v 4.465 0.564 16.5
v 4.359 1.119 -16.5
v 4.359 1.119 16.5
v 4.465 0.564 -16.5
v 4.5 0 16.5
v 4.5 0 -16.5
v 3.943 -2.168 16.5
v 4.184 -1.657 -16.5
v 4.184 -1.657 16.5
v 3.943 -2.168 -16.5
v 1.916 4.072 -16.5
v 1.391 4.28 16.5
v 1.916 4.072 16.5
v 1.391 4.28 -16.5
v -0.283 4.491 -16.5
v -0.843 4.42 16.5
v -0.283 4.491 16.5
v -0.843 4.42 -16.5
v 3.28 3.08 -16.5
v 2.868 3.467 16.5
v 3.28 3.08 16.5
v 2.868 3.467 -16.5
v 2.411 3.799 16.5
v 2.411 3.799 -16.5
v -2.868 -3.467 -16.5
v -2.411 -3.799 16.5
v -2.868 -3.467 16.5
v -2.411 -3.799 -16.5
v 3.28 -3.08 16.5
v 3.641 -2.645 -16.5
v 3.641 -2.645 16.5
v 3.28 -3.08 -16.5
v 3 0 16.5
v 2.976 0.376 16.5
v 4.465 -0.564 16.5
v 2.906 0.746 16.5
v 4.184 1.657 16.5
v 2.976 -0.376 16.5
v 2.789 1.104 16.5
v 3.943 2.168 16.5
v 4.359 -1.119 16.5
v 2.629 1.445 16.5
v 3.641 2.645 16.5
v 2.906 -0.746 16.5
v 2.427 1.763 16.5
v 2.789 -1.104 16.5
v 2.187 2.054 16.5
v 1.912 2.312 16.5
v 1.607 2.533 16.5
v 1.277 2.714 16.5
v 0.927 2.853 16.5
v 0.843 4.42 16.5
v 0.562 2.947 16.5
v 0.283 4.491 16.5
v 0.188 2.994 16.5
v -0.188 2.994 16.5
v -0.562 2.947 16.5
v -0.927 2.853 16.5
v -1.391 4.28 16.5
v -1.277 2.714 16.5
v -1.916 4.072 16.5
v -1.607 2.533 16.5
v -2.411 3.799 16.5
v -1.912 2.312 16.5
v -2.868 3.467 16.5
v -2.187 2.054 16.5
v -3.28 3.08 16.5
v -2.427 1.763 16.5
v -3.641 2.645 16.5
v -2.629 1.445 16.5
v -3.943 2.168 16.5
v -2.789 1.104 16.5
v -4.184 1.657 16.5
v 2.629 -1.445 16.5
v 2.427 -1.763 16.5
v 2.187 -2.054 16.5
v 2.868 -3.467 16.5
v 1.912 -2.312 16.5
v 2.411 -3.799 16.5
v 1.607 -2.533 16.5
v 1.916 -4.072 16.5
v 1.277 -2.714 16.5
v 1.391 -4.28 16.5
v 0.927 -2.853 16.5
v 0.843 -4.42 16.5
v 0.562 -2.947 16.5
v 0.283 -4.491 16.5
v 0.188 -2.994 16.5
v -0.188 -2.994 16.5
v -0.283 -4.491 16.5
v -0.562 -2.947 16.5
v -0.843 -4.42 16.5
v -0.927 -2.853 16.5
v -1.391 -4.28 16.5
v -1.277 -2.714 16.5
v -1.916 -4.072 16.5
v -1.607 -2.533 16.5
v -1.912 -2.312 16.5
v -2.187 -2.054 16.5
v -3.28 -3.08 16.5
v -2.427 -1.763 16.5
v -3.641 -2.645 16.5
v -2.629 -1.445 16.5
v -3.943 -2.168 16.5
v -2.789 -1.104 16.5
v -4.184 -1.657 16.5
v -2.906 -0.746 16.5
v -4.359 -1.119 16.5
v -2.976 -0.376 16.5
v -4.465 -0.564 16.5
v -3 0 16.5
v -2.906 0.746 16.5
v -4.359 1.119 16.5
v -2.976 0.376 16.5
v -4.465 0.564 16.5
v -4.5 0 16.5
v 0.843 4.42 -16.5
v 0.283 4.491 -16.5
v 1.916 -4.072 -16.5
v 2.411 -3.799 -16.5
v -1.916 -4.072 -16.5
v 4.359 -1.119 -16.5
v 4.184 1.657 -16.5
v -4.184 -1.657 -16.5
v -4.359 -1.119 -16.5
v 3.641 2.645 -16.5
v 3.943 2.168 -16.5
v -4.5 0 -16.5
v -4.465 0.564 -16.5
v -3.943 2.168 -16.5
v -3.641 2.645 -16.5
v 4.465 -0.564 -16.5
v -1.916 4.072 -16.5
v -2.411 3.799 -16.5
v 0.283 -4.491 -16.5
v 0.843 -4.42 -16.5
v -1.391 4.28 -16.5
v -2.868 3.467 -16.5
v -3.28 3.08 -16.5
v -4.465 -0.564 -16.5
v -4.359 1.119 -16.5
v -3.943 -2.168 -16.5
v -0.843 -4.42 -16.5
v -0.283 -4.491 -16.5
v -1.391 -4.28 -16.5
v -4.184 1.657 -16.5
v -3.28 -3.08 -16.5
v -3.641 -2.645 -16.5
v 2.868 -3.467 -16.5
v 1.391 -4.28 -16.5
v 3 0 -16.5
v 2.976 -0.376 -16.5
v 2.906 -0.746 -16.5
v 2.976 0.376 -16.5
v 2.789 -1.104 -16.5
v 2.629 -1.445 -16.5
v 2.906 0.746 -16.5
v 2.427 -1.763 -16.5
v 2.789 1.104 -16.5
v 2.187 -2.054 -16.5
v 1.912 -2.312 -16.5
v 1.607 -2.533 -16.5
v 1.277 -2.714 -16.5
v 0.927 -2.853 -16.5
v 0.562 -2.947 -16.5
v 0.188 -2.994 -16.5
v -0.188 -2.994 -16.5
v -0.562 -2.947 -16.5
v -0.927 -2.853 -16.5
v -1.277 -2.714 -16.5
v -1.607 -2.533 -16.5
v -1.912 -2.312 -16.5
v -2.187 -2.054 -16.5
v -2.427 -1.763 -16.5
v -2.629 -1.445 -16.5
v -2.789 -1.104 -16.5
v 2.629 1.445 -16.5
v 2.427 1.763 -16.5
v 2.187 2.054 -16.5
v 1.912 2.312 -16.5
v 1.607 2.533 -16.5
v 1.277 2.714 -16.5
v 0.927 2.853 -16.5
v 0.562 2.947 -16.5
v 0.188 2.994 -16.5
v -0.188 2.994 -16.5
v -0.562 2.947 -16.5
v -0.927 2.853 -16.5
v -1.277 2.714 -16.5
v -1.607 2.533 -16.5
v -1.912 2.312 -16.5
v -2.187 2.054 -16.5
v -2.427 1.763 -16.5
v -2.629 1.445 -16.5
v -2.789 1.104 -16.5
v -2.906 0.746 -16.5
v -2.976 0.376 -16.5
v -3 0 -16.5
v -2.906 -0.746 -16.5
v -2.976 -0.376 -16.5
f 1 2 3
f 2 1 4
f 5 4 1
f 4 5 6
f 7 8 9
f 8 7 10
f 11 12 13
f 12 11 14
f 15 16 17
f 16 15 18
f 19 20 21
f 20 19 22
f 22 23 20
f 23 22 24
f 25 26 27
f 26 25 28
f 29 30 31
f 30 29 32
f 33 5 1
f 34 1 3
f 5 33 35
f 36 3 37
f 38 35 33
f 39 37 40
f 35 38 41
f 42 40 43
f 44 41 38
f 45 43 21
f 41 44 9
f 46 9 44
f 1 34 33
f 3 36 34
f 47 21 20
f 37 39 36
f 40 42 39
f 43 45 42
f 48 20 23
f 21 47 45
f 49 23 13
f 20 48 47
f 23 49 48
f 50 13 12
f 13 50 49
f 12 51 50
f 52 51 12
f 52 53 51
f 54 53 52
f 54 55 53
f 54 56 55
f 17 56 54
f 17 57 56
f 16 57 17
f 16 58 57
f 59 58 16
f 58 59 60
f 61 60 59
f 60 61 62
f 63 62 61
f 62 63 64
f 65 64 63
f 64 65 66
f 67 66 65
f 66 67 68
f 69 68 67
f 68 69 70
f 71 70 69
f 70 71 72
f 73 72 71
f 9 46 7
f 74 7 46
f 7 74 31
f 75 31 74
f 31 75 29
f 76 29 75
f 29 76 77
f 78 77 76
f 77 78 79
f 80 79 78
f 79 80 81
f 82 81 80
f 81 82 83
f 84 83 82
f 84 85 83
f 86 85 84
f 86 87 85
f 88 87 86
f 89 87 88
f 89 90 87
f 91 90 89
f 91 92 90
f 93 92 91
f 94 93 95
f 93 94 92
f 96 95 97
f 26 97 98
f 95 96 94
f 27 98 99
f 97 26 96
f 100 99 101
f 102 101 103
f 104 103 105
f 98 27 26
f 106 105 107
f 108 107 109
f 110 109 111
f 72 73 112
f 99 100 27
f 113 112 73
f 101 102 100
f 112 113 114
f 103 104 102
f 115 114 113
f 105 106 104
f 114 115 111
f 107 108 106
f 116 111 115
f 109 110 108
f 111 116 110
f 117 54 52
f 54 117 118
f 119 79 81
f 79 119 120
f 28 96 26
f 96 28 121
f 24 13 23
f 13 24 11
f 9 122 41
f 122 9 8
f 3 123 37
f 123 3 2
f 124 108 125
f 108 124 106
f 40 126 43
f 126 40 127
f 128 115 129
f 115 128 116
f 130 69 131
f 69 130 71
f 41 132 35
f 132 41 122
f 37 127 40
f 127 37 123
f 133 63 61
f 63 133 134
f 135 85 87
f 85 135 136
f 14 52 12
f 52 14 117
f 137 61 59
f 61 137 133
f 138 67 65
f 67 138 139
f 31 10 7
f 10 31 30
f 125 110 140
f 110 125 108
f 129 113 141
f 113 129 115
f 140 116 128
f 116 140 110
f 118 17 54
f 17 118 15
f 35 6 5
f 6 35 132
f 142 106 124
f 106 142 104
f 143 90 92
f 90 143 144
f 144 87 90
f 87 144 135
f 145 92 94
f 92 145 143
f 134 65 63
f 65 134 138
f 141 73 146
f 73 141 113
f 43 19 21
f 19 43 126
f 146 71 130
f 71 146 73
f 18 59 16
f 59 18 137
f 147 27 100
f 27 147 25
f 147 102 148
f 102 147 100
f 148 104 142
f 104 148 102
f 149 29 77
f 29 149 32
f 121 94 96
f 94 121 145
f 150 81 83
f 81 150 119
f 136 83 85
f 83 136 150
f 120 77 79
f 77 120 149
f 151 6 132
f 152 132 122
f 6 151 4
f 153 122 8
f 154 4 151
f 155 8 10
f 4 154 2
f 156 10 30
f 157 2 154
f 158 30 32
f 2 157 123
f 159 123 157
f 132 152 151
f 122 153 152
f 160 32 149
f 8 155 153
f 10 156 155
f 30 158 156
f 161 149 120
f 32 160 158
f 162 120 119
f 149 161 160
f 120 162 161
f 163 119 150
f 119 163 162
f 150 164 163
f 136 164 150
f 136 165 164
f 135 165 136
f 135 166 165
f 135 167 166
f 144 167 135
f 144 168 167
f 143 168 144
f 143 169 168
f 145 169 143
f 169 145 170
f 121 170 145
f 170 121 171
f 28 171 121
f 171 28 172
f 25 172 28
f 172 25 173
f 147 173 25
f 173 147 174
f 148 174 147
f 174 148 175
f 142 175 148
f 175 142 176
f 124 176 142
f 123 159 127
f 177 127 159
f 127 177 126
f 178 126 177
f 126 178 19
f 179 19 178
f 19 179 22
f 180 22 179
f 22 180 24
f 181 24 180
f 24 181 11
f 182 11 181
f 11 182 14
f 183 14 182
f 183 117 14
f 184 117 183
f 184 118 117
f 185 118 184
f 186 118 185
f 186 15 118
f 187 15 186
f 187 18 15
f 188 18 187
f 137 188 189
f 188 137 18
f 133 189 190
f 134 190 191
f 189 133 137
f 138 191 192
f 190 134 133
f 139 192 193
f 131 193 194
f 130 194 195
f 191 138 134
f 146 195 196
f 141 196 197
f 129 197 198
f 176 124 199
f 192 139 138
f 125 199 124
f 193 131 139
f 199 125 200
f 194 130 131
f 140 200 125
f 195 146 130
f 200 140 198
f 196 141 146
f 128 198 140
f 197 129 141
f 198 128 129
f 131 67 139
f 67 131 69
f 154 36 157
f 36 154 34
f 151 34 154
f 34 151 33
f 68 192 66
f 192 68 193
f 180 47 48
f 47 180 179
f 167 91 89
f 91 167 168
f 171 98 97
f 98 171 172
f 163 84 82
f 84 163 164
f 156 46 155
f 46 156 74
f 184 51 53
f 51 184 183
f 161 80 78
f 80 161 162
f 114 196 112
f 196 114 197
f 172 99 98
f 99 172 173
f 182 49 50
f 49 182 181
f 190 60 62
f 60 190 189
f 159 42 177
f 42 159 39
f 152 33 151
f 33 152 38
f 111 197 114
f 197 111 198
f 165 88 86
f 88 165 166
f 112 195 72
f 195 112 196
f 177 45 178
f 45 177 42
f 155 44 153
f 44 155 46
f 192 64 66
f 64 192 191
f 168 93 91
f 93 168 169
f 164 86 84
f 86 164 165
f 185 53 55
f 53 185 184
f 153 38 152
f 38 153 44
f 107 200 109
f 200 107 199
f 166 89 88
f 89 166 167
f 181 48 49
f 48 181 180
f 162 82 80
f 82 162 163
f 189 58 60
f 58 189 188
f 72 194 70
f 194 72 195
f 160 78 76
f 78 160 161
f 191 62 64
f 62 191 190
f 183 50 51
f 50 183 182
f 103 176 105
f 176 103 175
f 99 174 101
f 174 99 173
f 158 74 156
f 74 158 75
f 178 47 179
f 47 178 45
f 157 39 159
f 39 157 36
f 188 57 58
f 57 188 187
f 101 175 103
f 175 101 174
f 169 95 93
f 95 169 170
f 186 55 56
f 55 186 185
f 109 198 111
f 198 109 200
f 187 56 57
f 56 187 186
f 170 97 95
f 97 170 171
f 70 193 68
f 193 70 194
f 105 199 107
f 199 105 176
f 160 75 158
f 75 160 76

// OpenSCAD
$fn = 50;


difference() {
	union() {
		translate(v = [0, 0, -16.5000000000]) {
			cylinder(h = 33, r = 4.5000000000);
		}
	}
	union() {
		translate(v = [0, 0, -100.0000000000]) {
			cylinder(h = 200, r = 3.0000000000);
		}
	}
}
